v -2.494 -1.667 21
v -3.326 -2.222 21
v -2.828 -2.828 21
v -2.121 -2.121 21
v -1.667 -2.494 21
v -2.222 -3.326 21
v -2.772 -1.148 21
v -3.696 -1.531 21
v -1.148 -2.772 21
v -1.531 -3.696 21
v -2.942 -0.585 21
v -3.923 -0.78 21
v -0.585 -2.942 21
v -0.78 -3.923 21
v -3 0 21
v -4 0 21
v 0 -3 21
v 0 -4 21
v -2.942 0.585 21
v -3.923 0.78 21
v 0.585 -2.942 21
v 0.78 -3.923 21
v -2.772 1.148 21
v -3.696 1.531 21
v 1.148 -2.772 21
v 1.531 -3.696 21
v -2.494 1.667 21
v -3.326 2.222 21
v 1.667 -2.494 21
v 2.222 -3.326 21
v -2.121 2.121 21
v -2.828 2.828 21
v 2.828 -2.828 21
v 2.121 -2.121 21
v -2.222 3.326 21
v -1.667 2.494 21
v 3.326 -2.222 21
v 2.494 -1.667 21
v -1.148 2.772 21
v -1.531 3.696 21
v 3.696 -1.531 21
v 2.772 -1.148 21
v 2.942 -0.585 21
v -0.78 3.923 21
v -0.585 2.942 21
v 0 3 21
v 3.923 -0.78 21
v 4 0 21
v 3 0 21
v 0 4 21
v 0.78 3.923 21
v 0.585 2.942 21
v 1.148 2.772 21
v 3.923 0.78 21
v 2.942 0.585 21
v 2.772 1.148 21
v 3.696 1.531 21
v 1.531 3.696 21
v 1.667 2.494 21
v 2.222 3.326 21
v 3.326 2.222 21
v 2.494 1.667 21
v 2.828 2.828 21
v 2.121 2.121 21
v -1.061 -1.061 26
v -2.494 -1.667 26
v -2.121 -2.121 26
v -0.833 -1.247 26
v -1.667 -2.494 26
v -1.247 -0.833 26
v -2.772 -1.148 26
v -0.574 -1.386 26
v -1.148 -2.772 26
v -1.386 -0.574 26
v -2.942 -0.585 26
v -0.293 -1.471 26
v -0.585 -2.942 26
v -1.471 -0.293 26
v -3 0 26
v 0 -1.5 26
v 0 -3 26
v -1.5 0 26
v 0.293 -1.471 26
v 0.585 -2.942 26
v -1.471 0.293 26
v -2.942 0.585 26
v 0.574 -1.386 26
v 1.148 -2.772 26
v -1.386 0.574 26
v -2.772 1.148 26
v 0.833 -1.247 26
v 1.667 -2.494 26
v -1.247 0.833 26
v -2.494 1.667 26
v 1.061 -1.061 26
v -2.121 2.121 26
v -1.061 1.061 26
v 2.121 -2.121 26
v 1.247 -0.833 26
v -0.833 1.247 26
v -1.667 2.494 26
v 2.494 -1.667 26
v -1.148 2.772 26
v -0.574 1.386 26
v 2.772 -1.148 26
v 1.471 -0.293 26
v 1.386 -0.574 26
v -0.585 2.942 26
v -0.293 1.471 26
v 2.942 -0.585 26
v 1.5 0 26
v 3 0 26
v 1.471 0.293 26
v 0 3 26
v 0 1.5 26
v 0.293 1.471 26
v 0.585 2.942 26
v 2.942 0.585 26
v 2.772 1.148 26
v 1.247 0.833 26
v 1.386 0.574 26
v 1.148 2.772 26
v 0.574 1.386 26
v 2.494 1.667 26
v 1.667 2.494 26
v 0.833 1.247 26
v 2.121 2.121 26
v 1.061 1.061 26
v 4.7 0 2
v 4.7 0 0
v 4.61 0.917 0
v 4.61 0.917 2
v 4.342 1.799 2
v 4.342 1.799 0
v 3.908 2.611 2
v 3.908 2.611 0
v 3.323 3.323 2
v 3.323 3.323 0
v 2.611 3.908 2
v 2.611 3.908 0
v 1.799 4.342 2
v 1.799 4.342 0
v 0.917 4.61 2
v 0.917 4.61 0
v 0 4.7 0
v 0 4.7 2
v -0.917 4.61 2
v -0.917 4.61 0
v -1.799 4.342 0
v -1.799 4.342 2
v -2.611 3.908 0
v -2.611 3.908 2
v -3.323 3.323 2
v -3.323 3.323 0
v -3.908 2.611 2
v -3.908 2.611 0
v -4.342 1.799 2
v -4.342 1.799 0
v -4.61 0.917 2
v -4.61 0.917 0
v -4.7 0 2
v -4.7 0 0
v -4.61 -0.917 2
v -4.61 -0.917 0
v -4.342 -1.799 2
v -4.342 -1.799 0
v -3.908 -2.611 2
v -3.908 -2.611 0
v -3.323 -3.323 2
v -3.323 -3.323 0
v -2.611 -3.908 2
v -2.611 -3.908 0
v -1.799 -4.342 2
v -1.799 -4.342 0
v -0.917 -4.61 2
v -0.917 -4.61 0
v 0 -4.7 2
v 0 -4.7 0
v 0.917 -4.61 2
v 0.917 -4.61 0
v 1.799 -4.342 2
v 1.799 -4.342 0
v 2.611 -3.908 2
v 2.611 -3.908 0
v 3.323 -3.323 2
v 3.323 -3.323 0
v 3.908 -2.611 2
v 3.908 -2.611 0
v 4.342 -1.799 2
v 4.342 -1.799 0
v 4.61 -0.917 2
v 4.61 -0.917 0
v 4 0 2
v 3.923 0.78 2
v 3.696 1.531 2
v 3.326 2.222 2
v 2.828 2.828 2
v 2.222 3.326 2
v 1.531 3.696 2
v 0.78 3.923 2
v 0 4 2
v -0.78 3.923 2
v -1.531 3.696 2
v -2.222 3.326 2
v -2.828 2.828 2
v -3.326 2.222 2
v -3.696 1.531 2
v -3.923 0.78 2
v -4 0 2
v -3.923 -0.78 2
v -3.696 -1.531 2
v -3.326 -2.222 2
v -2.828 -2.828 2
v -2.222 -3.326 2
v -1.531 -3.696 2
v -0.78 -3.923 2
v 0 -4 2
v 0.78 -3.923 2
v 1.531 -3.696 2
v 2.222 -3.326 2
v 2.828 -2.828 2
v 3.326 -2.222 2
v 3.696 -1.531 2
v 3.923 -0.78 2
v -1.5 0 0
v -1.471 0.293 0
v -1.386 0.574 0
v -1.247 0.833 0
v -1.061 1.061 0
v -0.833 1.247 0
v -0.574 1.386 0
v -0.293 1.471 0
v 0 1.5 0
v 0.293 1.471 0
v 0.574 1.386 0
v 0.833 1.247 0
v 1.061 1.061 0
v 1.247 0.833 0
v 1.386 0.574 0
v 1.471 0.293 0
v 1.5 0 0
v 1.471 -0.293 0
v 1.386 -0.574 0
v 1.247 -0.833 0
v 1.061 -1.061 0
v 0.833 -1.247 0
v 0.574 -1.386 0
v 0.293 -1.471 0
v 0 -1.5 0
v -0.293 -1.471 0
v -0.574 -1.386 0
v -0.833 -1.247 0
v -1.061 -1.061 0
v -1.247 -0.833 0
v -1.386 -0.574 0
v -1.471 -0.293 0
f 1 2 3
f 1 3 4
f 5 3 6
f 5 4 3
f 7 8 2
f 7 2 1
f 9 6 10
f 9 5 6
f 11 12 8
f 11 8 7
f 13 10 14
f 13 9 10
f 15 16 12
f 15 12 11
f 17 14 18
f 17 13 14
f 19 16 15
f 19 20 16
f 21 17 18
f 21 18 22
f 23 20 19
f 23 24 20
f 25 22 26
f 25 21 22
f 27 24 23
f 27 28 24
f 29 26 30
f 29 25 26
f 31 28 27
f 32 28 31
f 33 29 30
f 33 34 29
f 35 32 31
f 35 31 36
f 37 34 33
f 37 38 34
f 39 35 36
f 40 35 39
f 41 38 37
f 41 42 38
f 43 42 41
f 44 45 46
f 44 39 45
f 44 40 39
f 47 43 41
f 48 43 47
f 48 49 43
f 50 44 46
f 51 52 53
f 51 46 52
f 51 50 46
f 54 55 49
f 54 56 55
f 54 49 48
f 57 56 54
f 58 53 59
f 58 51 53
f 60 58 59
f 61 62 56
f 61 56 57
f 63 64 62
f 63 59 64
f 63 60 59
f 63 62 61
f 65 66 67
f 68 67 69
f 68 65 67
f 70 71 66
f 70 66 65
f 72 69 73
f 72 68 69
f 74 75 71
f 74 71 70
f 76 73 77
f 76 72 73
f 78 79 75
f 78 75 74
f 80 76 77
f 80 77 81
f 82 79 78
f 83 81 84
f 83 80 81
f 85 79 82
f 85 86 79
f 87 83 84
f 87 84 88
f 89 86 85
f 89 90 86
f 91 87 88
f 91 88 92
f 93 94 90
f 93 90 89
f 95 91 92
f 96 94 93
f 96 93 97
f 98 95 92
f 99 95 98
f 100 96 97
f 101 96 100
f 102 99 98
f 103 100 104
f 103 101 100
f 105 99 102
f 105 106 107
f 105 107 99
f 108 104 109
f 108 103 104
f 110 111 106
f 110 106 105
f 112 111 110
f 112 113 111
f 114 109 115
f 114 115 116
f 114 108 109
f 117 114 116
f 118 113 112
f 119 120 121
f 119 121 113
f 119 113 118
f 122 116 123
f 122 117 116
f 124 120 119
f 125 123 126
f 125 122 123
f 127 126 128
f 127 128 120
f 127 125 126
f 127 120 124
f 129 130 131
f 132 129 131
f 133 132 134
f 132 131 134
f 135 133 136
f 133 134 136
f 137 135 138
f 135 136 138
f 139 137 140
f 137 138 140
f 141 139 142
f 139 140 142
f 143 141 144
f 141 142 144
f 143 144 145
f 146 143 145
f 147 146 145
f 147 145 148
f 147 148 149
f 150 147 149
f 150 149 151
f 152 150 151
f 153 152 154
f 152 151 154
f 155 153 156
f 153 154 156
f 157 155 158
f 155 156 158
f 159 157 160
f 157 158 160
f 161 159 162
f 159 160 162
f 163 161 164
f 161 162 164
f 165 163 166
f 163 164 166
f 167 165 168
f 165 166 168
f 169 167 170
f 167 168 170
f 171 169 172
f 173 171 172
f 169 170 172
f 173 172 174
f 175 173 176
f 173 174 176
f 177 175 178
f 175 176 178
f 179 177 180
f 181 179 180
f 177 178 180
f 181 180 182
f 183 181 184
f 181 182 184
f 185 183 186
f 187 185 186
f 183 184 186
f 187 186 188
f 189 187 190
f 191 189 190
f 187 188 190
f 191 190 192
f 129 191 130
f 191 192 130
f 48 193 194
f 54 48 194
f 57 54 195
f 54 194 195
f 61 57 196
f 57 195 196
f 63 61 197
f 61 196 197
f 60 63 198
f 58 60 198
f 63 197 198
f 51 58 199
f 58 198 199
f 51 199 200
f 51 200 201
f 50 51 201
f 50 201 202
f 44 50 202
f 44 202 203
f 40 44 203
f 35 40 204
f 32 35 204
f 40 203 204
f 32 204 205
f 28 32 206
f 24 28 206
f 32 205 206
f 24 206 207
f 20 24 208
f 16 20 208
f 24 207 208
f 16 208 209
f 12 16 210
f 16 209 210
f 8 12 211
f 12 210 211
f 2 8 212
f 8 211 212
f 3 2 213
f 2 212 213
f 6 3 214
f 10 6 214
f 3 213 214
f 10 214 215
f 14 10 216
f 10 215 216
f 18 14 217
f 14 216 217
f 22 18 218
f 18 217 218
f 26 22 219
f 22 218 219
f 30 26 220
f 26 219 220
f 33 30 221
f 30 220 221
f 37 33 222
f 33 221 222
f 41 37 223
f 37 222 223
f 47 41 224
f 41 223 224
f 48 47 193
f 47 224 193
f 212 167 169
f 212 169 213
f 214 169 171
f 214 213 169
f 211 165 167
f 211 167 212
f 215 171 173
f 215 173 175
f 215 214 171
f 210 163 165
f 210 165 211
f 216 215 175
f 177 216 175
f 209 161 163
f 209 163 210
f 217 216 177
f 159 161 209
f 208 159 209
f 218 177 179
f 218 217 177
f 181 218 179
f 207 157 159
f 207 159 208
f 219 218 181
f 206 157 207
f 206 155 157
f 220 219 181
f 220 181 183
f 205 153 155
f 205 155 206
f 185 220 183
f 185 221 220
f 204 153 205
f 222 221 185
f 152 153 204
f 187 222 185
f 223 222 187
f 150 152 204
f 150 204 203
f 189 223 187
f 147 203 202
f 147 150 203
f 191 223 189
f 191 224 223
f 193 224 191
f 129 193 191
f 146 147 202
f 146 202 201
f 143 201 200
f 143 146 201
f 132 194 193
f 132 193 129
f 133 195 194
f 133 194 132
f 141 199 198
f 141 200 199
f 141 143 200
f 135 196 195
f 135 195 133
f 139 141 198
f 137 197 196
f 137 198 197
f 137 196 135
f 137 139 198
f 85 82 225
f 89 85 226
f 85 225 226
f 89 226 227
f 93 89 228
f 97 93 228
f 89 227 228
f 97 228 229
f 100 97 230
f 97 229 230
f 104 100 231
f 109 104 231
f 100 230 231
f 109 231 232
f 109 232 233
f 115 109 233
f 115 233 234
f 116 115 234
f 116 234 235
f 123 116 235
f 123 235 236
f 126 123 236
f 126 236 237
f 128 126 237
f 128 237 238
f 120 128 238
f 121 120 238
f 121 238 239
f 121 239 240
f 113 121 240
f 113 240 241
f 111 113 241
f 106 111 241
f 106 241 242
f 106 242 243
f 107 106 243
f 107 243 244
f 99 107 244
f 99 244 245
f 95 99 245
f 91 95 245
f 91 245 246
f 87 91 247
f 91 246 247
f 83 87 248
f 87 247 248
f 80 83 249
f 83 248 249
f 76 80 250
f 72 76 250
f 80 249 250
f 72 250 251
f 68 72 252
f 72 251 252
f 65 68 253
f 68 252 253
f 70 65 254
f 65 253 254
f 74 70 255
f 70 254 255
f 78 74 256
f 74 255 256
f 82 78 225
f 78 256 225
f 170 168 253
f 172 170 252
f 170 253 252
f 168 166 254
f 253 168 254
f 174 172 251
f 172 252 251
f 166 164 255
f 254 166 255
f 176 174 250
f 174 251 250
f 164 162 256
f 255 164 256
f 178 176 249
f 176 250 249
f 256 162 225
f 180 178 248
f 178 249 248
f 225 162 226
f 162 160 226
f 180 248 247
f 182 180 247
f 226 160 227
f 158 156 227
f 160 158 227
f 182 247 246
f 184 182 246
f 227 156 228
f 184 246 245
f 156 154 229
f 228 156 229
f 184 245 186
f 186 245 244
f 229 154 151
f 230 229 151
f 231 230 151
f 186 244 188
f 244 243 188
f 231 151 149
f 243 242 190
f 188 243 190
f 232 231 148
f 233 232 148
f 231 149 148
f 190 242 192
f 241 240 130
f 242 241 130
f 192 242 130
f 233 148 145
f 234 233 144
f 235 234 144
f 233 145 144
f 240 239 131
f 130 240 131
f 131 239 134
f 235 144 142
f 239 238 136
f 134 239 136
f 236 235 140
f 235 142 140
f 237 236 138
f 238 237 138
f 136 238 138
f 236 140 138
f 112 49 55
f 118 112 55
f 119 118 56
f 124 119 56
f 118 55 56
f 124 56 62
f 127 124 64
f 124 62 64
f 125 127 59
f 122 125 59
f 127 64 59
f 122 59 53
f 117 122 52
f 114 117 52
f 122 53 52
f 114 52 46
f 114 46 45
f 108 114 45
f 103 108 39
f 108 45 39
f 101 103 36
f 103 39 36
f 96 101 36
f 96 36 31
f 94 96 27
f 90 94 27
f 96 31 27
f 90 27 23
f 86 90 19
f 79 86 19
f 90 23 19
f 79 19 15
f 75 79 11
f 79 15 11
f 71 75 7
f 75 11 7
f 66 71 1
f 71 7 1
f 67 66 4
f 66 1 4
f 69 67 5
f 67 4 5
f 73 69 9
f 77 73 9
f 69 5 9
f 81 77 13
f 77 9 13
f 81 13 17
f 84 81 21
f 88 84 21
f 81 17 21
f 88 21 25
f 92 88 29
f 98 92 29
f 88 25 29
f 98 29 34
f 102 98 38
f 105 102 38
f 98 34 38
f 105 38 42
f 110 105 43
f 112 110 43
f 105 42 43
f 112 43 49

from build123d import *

# Parameters (mm, degrees)
SKETCH1_R          = 4.7
EXTRUDE1_DEPTH     = 2
SKETCH2_R          = 4
EXTRUDE2_DEPTH     = 19
SKETCH3_R          = 3
EXTRUDE3_DEPTH     = 5
SKETCH4_R          = 1.5
CUT_EXTRUDE1_DEPTH = 27


with BuildPart() as part:
    # Sketch1 → Extrude1 (new body)
    with BuildSketch(Plane.XY):
        Circle(SKETCH1_R)
    extrude(amount=EXTRUDE1_DEPTH)

    # Sketch2 → Extrude2 (add)
    with BuildSketch(Plane.XY.offset(2)):
        Circle(SKETCH2_R)
    extrude(amount=EXTRUDE2_DEPTH)

    # Sketch3 → Extrude3 (add)
    with BuildSketch(Plane.XY.offset(21)):
        Circle(SKETCH3_R)
    extrude(amount=EXTRUDE3_DEPTH)

    # Sketch4 → Cut-Extrude1 (cut, through all)
    with BuildSketch(Plane(origin=(0, 0, 0), x_dir=(-1, 0, 0), z_dir=(0, 0, -1))):
        Circle(SKETCH4_R)
    extrude(amount=-CUT_EXTRUDE1_DEPTH, mode=Mode.SUBTRACT)


solid = part.part
